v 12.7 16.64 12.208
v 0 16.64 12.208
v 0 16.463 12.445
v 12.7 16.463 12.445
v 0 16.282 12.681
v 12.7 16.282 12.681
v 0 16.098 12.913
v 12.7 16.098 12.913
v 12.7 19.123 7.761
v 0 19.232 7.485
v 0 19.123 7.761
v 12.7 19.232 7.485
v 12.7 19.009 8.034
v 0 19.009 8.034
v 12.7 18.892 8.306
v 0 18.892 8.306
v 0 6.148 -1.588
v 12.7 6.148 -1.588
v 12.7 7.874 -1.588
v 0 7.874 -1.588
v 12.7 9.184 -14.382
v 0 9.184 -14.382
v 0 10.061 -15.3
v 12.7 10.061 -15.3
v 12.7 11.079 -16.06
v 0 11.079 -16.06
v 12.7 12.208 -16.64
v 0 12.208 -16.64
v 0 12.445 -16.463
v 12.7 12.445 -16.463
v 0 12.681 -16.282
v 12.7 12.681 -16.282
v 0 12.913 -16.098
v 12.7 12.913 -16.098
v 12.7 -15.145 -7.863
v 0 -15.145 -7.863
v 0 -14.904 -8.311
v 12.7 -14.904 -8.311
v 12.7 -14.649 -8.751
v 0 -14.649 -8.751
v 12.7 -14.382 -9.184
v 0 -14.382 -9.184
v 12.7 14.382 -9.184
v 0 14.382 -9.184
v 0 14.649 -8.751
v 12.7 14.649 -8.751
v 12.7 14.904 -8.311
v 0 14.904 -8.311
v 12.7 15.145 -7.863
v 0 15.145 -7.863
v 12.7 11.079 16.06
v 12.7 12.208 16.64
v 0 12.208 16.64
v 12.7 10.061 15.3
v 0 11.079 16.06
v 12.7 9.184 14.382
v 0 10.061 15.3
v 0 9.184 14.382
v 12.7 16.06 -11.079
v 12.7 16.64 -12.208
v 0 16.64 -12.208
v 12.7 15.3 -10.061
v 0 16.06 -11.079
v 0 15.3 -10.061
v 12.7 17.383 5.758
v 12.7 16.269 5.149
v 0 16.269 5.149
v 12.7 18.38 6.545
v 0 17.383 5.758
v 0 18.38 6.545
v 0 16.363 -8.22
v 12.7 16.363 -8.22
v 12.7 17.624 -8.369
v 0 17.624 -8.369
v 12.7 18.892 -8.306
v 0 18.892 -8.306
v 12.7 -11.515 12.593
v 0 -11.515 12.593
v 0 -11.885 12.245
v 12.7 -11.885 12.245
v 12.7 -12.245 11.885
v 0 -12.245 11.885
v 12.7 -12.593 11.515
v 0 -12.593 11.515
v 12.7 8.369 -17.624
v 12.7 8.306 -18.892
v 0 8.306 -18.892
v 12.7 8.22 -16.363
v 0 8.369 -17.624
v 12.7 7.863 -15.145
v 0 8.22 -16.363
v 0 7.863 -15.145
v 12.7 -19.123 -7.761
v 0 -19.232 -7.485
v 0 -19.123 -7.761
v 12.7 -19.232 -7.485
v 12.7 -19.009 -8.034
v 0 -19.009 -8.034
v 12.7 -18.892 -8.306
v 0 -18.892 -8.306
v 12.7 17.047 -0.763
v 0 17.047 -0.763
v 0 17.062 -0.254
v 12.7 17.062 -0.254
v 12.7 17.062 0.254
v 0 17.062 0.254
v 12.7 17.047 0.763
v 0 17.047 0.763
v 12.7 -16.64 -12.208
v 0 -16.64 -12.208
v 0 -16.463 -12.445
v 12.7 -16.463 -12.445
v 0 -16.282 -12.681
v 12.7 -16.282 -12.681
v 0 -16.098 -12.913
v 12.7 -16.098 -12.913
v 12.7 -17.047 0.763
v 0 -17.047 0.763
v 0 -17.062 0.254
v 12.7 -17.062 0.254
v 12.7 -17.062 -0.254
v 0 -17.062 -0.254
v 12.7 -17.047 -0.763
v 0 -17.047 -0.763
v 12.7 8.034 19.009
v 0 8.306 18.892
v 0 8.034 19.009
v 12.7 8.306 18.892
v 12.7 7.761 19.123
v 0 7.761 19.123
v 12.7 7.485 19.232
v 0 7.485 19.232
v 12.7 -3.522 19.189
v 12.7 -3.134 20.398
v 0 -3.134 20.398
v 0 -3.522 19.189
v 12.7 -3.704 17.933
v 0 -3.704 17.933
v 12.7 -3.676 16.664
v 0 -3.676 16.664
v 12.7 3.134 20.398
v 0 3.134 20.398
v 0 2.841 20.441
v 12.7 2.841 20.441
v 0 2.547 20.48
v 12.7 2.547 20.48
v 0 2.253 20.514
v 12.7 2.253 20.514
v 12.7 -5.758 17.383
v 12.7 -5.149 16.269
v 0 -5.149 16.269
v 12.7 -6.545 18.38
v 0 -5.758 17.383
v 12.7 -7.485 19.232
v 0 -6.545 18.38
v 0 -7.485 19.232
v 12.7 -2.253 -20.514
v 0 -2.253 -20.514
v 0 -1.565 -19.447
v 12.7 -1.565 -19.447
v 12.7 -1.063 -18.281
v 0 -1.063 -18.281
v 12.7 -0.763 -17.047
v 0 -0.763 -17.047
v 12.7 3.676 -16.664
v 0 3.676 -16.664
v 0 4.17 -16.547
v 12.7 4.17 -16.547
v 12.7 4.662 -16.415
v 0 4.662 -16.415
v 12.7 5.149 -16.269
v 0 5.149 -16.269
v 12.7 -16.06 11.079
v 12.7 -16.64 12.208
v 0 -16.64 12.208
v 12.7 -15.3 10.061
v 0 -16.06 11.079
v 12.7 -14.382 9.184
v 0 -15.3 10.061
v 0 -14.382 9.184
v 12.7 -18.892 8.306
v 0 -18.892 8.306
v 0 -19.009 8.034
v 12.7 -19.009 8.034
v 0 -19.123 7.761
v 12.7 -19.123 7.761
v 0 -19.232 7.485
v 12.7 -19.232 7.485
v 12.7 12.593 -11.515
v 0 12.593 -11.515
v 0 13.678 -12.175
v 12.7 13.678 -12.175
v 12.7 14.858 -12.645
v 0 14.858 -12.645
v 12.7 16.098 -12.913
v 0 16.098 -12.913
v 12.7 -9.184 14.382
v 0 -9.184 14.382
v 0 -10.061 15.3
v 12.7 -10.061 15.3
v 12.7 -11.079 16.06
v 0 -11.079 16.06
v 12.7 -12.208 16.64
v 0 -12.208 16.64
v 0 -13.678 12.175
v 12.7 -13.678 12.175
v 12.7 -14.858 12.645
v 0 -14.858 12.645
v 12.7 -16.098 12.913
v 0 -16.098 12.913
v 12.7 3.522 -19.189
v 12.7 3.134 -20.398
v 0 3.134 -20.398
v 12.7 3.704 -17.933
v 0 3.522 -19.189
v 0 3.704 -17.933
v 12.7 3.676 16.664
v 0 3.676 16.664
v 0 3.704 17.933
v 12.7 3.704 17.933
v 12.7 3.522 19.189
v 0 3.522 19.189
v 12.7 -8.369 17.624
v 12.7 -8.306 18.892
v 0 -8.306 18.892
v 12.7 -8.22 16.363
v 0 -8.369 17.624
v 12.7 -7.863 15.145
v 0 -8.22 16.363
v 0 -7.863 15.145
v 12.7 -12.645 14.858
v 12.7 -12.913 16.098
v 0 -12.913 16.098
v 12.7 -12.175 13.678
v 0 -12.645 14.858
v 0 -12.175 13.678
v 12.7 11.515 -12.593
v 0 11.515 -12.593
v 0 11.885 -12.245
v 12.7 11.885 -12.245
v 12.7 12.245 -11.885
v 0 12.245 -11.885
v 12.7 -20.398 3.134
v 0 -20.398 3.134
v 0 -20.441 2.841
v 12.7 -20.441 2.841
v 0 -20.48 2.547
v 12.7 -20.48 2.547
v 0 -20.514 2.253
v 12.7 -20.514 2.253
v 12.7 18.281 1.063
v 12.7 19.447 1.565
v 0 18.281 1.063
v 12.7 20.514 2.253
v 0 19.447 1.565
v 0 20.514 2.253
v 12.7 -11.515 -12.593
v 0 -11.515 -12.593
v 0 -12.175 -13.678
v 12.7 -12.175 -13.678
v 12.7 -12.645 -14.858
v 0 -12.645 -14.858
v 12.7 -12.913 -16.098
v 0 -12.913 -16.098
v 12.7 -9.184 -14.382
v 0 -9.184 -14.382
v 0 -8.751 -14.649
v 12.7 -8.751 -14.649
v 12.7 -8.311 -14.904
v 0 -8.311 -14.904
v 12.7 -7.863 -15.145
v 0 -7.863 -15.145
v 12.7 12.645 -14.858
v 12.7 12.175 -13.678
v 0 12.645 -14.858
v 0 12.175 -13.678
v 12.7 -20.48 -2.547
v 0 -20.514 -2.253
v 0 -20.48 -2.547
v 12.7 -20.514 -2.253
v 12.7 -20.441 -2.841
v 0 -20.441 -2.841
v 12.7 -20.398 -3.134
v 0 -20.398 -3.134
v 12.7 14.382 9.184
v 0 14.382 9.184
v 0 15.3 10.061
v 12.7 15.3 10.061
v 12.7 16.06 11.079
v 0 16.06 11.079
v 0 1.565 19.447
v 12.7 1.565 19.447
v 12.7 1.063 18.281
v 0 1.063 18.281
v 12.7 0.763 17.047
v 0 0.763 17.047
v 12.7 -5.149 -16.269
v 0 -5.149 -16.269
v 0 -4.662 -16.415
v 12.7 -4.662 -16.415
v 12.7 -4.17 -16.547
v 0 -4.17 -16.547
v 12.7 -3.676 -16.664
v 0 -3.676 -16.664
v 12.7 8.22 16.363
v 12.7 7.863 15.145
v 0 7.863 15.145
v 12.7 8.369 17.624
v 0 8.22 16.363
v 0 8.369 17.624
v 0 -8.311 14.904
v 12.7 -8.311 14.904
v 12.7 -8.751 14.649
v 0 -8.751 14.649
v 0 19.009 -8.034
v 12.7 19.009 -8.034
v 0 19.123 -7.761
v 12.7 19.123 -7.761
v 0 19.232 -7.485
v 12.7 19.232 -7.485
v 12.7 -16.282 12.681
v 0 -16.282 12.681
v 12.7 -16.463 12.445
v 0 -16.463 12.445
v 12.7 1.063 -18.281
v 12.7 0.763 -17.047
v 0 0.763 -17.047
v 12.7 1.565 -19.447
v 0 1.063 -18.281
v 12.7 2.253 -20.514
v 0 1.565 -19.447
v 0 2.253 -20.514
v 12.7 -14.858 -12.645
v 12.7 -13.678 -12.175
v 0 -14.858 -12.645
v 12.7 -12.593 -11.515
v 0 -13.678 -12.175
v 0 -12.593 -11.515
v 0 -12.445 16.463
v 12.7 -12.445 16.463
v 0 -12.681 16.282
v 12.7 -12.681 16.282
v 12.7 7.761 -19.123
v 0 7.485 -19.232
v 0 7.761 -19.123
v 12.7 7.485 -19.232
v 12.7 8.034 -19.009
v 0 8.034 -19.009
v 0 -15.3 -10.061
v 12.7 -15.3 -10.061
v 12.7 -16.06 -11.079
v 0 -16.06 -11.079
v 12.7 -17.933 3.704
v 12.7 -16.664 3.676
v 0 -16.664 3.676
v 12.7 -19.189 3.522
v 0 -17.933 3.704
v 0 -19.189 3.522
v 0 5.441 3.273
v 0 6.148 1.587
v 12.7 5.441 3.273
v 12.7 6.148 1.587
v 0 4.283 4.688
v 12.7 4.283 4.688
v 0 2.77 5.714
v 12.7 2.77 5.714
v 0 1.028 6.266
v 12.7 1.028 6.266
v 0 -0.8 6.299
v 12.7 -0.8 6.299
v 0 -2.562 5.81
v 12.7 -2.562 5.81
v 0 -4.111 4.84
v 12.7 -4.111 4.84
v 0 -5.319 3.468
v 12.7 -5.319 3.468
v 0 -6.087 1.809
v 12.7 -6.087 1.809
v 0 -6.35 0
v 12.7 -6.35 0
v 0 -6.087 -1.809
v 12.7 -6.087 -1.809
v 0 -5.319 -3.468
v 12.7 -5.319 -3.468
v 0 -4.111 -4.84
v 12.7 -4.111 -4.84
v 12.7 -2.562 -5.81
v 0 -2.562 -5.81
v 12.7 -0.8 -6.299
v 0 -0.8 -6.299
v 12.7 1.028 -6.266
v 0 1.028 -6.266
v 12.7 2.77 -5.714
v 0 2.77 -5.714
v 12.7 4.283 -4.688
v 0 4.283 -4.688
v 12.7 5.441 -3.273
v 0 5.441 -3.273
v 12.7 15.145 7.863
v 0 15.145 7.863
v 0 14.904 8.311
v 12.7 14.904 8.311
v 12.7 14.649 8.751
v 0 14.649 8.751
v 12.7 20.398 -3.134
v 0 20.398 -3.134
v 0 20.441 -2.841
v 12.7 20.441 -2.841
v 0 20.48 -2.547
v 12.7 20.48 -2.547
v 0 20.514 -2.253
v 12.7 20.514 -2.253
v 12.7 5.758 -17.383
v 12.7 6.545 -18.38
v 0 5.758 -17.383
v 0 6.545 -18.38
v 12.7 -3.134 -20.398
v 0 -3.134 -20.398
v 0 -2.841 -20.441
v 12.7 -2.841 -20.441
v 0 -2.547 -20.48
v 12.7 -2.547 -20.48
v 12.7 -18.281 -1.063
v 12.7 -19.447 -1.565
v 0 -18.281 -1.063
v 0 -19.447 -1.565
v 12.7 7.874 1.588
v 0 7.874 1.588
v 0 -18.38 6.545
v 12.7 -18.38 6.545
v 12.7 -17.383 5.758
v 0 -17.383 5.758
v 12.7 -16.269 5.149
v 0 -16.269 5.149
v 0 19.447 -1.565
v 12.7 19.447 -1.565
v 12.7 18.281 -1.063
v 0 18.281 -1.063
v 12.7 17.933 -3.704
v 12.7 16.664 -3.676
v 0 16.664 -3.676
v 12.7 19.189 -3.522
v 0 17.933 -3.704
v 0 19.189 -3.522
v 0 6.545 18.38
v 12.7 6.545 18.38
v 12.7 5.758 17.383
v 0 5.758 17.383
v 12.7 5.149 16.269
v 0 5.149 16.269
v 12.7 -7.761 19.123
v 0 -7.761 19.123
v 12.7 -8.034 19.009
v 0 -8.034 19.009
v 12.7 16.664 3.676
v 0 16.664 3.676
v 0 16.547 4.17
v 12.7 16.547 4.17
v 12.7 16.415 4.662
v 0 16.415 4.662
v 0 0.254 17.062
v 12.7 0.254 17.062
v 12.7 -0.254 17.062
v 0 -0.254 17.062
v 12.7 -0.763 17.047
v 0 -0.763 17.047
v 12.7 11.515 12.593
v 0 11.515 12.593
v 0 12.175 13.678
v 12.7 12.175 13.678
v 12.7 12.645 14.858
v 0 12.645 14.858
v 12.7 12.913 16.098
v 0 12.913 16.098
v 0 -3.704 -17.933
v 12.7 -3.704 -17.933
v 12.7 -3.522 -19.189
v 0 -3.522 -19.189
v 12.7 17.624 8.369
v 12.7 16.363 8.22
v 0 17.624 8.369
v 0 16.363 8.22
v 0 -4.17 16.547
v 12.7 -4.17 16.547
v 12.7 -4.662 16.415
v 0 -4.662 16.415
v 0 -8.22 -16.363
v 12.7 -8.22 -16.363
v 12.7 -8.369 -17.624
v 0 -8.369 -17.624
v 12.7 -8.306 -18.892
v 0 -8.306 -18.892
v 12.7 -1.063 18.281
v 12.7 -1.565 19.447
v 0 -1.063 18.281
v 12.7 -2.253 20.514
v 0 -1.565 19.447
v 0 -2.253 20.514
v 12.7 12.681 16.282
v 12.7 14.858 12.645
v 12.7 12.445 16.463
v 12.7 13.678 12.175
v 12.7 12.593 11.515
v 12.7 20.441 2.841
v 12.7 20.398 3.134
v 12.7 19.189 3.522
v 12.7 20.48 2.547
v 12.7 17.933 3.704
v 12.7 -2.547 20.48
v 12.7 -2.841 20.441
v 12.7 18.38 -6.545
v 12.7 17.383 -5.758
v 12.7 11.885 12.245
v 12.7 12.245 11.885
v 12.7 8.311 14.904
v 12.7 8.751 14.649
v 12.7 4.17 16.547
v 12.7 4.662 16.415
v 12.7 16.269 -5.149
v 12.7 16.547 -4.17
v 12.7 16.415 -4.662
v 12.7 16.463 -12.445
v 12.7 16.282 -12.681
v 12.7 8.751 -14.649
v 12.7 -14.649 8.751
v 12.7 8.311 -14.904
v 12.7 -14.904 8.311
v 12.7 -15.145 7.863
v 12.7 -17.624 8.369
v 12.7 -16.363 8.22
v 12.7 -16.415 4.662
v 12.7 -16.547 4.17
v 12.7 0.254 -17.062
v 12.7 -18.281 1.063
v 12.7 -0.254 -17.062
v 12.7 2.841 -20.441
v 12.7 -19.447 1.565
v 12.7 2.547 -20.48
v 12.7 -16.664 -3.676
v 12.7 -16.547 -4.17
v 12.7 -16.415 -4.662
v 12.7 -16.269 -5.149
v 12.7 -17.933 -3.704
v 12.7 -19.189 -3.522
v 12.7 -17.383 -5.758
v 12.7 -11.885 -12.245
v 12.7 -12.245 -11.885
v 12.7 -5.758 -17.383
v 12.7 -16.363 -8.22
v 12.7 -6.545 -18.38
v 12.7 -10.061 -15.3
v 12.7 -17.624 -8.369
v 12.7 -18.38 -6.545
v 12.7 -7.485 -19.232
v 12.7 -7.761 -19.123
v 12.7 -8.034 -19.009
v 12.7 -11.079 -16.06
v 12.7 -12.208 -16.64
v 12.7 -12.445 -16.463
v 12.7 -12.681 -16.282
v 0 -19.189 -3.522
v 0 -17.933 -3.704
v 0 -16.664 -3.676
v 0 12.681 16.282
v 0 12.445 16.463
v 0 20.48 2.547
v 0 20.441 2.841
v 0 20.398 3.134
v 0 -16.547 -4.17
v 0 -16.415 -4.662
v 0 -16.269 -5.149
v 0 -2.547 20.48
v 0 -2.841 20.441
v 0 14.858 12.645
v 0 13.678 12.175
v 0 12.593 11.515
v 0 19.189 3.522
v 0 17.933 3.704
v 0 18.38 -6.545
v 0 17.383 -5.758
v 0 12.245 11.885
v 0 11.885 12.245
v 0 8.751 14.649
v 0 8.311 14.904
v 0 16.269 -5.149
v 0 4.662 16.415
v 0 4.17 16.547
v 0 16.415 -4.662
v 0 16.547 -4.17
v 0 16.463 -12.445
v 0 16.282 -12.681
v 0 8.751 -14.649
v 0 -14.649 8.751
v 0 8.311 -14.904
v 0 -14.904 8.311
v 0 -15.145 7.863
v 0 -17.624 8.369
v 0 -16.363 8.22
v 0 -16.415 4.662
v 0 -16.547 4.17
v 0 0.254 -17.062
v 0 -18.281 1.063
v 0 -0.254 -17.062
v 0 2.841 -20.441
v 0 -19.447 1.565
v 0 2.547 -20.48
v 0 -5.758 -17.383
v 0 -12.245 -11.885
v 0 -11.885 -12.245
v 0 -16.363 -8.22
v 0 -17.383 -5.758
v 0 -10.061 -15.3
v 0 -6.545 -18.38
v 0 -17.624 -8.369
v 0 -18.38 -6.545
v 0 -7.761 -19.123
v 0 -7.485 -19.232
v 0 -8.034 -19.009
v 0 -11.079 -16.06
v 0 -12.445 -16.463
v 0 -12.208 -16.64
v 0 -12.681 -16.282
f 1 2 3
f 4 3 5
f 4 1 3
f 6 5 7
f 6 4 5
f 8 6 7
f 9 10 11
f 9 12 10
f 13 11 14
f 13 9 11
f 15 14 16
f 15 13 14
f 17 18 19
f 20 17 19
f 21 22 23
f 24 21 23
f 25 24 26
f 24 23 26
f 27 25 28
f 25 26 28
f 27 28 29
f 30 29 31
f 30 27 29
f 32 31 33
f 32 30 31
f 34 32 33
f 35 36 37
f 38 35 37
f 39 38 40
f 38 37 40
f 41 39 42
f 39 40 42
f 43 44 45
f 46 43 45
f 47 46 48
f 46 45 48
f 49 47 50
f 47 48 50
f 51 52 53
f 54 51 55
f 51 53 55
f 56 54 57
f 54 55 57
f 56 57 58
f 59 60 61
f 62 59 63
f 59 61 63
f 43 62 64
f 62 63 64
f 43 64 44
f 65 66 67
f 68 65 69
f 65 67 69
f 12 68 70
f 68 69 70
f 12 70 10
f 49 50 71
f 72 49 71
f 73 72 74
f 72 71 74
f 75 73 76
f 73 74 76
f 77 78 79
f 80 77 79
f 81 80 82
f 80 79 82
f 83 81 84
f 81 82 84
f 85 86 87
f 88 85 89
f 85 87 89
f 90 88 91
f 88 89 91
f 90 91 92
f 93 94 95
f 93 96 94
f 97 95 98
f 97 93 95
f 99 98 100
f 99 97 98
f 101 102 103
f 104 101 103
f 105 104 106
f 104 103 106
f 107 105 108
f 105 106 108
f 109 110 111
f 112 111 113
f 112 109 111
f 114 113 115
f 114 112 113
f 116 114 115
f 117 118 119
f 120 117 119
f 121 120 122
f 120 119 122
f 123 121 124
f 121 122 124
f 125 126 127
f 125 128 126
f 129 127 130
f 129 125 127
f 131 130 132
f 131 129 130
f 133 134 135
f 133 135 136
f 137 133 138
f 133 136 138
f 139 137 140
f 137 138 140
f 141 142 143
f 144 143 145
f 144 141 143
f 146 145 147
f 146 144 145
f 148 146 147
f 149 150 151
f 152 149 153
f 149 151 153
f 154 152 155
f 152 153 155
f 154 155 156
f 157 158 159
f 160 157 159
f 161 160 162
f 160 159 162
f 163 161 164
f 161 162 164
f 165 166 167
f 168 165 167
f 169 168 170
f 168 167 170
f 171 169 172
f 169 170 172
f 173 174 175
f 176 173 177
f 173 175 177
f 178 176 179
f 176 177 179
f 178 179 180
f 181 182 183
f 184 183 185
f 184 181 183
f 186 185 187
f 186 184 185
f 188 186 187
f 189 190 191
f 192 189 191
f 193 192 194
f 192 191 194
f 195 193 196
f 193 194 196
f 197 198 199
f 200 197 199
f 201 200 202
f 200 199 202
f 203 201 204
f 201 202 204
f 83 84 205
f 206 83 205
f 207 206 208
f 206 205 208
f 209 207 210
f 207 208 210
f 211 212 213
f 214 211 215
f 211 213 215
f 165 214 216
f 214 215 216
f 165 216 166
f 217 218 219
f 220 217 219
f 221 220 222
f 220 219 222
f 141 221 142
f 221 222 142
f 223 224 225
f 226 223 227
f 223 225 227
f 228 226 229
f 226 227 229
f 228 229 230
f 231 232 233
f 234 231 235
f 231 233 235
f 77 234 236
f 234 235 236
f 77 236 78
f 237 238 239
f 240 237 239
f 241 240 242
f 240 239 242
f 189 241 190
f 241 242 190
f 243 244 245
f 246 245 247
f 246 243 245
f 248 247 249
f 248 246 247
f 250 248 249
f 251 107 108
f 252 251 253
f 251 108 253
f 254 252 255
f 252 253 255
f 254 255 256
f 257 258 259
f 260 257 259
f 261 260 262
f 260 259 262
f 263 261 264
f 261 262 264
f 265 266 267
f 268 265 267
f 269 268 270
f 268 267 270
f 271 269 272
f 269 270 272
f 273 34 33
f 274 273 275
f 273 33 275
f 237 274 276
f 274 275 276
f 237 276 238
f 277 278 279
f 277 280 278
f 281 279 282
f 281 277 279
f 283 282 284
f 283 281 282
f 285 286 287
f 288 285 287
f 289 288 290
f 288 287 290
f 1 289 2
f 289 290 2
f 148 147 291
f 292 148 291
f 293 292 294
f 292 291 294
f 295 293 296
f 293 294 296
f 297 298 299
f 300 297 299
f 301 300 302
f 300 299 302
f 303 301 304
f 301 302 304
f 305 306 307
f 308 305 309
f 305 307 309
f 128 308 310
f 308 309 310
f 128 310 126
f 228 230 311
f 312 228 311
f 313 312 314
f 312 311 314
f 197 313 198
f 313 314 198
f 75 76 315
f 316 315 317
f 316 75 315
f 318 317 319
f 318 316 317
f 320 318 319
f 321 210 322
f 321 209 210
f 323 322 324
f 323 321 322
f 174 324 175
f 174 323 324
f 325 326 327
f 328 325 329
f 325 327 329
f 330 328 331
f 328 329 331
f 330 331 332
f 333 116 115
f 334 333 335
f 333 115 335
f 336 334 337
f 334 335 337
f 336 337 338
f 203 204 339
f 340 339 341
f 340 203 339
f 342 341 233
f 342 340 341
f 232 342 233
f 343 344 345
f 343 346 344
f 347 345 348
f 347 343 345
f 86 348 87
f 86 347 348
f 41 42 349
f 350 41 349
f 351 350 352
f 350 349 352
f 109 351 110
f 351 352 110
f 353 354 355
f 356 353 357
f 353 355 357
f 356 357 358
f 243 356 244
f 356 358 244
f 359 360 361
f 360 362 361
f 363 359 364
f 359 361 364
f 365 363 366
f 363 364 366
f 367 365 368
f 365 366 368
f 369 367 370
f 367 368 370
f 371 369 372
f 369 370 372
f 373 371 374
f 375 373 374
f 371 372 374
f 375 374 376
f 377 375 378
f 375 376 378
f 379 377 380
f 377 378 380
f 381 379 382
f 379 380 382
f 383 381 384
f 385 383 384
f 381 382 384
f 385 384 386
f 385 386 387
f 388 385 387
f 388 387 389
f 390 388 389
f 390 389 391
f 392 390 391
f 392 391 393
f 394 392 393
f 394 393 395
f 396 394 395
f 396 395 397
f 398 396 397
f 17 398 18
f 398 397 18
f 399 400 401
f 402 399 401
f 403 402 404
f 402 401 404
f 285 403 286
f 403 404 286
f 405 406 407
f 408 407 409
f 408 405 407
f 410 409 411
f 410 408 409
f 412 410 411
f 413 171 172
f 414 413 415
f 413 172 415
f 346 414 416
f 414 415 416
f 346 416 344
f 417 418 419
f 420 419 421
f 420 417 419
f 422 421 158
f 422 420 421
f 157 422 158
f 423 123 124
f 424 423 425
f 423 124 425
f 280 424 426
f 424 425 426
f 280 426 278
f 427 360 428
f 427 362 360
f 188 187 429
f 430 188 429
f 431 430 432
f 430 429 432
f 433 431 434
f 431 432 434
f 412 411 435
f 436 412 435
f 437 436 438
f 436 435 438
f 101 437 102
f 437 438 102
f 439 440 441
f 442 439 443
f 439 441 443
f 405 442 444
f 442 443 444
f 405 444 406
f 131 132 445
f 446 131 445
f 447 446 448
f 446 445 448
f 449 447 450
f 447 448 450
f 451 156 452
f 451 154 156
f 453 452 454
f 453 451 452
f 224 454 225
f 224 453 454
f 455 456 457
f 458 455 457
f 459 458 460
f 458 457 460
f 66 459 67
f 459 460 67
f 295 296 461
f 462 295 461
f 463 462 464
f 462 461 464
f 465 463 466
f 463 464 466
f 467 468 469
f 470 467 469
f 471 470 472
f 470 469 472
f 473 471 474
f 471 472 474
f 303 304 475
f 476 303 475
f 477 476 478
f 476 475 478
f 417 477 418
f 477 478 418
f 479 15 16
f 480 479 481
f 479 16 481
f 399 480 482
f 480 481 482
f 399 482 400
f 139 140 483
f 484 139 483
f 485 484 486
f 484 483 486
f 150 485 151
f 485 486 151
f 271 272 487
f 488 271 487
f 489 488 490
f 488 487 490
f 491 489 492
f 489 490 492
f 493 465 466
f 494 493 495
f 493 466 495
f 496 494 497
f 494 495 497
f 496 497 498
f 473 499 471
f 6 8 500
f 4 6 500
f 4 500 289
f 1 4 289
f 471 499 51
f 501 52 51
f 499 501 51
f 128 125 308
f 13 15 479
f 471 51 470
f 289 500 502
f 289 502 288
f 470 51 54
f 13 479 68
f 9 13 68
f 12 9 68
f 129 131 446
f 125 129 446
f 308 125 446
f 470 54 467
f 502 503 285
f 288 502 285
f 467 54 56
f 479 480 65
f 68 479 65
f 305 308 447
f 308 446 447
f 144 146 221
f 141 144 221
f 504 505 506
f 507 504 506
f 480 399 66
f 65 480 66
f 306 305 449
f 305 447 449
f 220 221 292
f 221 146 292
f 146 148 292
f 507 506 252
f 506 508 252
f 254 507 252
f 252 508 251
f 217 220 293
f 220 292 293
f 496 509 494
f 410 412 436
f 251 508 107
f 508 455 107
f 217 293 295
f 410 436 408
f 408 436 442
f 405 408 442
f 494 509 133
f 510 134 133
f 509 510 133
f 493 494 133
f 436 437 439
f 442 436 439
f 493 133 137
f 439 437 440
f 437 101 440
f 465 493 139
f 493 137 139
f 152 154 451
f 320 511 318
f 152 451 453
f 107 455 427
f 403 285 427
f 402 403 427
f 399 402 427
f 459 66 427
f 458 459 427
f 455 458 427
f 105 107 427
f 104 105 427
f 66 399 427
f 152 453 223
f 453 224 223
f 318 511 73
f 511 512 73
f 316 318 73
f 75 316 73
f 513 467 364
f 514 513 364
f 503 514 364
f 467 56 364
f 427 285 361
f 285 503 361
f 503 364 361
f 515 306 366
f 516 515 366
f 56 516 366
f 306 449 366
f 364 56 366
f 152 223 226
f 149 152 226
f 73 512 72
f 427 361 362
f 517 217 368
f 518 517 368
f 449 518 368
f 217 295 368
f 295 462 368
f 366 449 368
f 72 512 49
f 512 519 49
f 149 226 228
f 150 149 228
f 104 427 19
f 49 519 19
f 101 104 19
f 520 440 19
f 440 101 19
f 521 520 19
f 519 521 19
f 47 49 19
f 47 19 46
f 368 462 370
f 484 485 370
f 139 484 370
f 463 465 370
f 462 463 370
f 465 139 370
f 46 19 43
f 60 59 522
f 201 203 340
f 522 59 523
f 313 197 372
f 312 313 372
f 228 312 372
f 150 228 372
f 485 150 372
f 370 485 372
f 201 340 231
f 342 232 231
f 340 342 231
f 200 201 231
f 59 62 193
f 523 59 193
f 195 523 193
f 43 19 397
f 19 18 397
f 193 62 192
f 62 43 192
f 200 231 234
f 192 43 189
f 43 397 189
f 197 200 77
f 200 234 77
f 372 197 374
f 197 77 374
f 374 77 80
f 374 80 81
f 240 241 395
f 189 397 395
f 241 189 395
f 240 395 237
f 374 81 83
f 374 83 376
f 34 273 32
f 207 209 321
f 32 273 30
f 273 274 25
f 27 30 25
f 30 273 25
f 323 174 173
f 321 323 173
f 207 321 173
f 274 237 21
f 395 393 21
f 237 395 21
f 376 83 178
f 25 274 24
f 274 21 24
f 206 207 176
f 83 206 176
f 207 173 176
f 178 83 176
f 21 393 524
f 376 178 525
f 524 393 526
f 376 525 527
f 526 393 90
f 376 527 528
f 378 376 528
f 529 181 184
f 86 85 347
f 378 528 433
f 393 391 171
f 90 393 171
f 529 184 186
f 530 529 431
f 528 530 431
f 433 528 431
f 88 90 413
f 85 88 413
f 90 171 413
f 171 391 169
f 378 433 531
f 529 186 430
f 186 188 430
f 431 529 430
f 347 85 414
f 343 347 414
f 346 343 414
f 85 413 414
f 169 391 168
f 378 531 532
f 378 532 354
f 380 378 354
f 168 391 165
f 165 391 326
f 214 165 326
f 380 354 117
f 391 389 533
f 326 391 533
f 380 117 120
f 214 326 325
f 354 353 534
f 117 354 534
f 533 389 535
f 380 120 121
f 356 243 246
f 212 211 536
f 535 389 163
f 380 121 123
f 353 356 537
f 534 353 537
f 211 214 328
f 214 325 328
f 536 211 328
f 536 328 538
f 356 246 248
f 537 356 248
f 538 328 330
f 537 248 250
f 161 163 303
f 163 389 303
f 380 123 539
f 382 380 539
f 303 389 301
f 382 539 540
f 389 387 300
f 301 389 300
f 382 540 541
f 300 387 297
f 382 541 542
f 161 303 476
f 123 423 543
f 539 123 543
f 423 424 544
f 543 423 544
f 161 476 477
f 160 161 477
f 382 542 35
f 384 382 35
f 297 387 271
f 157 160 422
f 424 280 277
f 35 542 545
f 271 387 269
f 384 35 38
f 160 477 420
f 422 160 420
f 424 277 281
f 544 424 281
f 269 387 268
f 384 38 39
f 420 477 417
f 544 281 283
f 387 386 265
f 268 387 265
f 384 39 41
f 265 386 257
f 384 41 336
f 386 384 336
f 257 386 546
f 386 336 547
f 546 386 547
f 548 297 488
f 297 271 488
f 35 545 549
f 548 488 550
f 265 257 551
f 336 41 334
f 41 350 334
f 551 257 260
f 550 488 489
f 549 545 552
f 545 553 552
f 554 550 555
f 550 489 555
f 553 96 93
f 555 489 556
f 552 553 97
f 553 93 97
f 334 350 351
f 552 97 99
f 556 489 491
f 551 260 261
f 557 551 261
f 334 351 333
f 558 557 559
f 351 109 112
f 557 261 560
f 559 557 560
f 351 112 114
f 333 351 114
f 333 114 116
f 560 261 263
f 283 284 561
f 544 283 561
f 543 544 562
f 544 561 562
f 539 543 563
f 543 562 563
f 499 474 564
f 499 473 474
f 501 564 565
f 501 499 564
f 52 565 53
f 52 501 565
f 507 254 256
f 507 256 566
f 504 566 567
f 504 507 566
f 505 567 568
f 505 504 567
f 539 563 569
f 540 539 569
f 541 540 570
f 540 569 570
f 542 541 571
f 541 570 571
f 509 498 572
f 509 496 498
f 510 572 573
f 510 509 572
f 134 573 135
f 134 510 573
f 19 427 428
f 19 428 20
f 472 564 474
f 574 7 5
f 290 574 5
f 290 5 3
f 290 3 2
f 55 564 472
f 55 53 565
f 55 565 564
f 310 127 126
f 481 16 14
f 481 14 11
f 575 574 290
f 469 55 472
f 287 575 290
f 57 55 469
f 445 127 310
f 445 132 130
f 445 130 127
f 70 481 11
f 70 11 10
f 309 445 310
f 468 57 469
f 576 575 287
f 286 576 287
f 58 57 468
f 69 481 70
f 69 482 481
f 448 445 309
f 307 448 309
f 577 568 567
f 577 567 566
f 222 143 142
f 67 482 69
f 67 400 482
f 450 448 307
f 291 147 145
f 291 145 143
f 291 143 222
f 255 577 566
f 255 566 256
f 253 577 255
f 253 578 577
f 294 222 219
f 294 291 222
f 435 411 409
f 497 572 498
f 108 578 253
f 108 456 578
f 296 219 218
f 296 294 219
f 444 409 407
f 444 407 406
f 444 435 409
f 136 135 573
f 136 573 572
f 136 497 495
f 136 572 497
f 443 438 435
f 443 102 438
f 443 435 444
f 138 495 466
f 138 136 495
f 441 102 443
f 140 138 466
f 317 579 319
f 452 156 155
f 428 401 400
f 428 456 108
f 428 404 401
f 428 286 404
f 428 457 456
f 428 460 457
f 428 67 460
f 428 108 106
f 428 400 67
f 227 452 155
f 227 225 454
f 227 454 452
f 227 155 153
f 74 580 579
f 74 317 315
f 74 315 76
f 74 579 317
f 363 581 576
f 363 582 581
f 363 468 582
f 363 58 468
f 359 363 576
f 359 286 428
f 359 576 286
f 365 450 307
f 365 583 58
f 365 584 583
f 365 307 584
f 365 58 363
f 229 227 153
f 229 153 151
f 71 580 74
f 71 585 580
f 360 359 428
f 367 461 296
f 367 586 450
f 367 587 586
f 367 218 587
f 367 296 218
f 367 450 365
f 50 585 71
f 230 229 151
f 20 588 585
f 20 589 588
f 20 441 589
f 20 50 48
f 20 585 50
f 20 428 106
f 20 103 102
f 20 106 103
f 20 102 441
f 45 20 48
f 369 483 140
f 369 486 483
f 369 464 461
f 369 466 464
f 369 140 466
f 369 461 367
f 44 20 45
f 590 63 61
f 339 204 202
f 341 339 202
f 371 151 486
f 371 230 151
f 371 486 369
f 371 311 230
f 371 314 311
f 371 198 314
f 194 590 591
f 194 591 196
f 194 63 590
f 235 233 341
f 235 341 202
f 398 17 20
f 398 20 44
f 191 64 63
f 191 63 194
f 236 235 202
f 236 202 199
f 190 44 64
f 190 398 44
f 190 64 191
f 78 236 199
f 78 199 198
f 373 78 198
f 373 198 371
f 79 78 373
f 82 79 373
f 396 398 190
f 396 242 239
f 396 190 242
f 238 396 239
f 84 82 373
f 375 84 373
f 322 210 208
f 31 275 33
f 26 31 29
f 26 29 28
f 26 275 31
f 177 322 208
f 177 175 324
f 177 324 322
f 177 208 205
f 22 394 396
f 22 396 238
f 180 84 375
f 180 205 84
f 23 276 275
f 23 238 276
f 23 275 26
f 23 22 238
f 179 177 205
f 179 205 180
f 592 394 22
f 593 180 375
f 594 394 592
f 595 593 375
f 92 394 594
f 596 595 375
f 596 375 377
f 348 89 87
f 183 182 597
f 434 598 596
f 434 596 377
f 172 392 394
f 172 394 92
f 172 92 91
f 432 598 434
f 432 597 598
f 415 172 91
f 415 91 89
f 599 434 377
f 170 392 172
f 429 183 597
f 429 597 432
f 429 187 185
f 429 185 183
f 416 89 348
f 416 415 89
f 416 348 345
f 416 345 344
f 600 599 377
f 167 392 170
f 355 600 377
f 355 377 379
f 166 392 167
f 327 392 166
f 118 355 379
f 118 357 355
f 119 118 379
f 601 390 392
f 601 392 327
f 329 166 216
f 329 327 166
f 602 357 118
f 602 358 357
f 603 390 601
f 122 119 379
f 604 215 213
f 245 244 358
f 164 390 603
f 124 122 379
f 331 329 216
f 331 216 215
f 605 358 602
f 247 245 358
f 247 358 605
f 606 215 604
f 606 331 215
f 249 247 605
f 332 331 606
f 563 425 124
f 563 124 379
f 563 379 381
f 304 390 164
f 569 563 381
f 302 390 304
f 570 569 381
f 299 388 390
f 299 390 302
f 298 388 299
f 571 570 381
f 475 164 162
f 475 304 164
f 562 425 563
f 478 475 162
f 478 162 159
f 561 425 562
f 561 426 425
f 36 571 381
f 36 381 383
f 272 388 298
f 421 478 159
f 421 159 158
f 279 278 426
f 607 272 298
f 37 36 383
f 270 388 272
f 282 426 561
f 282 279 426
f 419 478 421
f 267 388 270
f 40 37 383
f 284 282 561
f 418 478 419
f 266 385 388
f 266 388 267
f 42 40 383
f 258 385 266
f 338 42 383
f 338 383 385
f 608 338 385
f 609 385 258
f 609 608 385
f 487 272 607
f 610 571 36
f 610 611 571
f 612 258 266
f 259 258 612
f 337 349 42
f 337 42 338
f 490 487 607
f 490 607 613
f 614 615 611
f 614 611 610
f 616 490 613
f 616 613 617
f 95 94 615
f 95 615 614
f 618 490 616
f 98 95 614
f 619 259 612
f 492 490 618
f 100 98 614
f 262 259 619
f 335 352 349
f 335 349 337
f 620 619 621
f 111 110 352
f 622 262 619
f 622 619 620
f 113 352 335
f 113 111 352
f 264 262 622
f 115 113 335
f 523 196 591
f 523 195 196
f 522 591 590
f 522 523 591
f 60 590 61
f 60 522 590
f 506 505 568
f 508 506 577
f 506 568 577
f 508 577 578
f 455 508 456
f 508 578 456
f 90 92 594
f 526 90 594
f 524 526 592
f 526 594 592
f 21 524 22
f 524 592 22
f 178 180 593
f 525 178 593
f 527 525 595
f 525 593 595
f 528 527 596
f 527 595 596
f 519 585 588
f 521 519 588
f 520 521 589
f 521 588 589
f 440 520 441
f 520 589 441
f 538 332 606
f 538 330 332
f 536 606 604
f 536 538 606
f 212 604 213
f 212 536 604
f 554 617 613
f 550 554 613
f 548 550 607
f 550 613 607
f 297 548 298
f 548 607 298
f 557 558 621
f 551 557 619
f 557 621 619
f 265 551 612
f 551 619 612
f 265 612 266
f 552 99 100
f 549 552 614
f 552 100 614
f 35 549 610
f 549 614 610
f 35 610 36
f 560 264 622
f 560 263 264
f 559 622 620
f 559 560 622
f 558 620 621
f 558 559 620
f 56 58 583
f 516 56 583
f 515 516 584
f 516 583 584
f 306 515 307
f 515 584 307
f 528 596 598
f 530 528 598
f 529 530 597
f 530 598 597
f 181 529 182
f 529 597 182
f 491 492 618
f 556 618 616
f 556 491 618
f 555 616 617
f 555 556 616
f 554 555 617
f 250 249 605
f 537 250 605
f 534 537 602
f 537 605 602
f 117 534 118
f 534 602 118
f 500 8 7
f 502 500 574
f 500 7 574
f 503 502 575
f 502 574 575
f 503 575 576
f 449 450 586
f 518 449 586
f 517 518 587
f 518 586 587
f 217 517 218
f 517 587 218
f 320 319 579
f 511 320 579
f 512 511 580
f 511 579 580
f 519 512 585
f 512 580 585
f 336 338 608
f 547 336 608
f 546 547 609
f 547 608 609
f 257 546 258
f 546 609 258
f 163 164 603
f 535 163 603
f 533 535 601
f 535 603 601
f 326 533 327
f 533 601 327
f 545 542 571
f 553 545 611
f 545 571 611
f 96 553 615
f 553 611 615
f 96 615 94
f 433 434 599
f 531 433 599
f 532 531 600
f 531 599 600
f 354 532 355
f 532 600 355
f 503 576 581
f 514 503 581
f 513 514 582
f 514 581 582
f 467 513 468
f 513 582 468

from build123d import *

# Parameters (mm, degrees)
BASPROSKE_W             = 12.7
BASPROSKE_H             = 20.6375
TOOTHCUT_DEPTH          = 32.829276029
TEETHCUTS_COUNT         = 24
BORSKE_R                = 6.35
BORE_DEPTH              = 50.8000508
KEYSKE_W                = 3.175
KEYSKE_H                = 7.4676
KEYWAY_DEPTH            = 50.8000508
SKETCH1_W               = 3.175
SKETCH1_H               = 0.4064
CUT_EXTRUDE3_DEPTH      = 32.669469117
CUT_EXTRUDE3_DEPTH_BACK = 32.669469117


with BuildPart() as part:
    # BasProSke → Base-Revolve (revolve)
    with BuildSketch(Plane(origin=(0, 0, 0), x_dir=(1, 0, 0), z_dir=(0, 1, 0)), mode=Mode.PRIVATE) as base_revolve_sk:
        with Locations((6.35, 10.31875)):
            Rectangle(BASPROSKE_W, BASPROSKE_H)
    revolve(base_revolve_sk.sketch.rotate(Axis((-10, 0, 0), (1, 0, 0)), 180), axis=Axis((-10, 0, 0), (1, 0, 0)))

    # TooCutSke → ToothCut (cut, through all)
    with BuildSketch(Plane(origin=(0, 0, 0), x_dir=(0, 0, -1), z_dir=(1, 0, 0))):
        with BuildLine():
            ThreePointArc((0.762542858, 17.047308877), (0, 17.064355), (-0.762542858, 17.047308877))
            ThreePointArc((-0.762542858, 17.047308877), (-1.295412414, 18.888113288), (-2.270705673, 20.537753824))
            ThreePointArc((-2.270705673, 20.537753824), (0, 20.6629), (2.270705673, 20.537753824))
            ThreePointArc((2.270705673, 20.537753824), (1.295412414, 18.888113288), (0.762542858, 17.047308877))
        make_face()
    toothcut = extrude(amount=TOOTHCUT_DEPTH, mode=Mode.SUBTRACT)

    # TeethCuts: ToothCut ×24 about axis
    teethcuts_axis = Axis((0, 0, 0), (1, 0, 0))
    for i in range(1, TEETHCUTS_COUNT):
        add(toothcut.rotate(teethcuts_axis, i * 360 / TEETHCUTS_COUNT), mode=Mode.SUBTRACT)

    # BorSke → Bore (cut, symmetric)
    with BuildSketch(Plane(origin=(0, 0, 0), x_dir=(0, 0, -1), z_dir=(1, 0, 0))):
        with Locations(Location((0, 0, 0), (0, 0, 180))):
            Circle(BORSKE_R)
    extrude(amount=BORE_DEPTH, both=True, mode=Mode.SUBTRACT)

    # KeySke → Keyway (cut, symmetric)
    with BuildSketch(Plane(origin=(0, 0, 0), x_dir=(0, 0, -1), z_dir=(1, 0, 0))):
        with Locations((0, 3.7338)):
            Rectangle(KEYSKE_W, KEYSKE_H)
    extrude(amount=KEYWAY_DEPTH, both=True, mode=Mode.SUBTRACT)

    # Sketch1 → Cut-Extrude3 (cut, two sides)
    with BuildSketch(Plane(origin=(12.7, 0, 0), x_dir=(0, 0, -1), z_dir=(1, 0, 0))) as cut_extrude3_sk:
        with Locations((0, 7.6708)):
            Rectangle(SKETCH1_W, SKETCH1_H)
    extrude(amount=CUT_EXTRUDE3_DEPTH, mode=Mode.SUBTRACT)
    extrude(cut_extrude3_sk.sketch, amount=-CUT_EXTRUDE3_DEPTH_BACK, mode=Mode.SUBTRACT)


solid = part.part
